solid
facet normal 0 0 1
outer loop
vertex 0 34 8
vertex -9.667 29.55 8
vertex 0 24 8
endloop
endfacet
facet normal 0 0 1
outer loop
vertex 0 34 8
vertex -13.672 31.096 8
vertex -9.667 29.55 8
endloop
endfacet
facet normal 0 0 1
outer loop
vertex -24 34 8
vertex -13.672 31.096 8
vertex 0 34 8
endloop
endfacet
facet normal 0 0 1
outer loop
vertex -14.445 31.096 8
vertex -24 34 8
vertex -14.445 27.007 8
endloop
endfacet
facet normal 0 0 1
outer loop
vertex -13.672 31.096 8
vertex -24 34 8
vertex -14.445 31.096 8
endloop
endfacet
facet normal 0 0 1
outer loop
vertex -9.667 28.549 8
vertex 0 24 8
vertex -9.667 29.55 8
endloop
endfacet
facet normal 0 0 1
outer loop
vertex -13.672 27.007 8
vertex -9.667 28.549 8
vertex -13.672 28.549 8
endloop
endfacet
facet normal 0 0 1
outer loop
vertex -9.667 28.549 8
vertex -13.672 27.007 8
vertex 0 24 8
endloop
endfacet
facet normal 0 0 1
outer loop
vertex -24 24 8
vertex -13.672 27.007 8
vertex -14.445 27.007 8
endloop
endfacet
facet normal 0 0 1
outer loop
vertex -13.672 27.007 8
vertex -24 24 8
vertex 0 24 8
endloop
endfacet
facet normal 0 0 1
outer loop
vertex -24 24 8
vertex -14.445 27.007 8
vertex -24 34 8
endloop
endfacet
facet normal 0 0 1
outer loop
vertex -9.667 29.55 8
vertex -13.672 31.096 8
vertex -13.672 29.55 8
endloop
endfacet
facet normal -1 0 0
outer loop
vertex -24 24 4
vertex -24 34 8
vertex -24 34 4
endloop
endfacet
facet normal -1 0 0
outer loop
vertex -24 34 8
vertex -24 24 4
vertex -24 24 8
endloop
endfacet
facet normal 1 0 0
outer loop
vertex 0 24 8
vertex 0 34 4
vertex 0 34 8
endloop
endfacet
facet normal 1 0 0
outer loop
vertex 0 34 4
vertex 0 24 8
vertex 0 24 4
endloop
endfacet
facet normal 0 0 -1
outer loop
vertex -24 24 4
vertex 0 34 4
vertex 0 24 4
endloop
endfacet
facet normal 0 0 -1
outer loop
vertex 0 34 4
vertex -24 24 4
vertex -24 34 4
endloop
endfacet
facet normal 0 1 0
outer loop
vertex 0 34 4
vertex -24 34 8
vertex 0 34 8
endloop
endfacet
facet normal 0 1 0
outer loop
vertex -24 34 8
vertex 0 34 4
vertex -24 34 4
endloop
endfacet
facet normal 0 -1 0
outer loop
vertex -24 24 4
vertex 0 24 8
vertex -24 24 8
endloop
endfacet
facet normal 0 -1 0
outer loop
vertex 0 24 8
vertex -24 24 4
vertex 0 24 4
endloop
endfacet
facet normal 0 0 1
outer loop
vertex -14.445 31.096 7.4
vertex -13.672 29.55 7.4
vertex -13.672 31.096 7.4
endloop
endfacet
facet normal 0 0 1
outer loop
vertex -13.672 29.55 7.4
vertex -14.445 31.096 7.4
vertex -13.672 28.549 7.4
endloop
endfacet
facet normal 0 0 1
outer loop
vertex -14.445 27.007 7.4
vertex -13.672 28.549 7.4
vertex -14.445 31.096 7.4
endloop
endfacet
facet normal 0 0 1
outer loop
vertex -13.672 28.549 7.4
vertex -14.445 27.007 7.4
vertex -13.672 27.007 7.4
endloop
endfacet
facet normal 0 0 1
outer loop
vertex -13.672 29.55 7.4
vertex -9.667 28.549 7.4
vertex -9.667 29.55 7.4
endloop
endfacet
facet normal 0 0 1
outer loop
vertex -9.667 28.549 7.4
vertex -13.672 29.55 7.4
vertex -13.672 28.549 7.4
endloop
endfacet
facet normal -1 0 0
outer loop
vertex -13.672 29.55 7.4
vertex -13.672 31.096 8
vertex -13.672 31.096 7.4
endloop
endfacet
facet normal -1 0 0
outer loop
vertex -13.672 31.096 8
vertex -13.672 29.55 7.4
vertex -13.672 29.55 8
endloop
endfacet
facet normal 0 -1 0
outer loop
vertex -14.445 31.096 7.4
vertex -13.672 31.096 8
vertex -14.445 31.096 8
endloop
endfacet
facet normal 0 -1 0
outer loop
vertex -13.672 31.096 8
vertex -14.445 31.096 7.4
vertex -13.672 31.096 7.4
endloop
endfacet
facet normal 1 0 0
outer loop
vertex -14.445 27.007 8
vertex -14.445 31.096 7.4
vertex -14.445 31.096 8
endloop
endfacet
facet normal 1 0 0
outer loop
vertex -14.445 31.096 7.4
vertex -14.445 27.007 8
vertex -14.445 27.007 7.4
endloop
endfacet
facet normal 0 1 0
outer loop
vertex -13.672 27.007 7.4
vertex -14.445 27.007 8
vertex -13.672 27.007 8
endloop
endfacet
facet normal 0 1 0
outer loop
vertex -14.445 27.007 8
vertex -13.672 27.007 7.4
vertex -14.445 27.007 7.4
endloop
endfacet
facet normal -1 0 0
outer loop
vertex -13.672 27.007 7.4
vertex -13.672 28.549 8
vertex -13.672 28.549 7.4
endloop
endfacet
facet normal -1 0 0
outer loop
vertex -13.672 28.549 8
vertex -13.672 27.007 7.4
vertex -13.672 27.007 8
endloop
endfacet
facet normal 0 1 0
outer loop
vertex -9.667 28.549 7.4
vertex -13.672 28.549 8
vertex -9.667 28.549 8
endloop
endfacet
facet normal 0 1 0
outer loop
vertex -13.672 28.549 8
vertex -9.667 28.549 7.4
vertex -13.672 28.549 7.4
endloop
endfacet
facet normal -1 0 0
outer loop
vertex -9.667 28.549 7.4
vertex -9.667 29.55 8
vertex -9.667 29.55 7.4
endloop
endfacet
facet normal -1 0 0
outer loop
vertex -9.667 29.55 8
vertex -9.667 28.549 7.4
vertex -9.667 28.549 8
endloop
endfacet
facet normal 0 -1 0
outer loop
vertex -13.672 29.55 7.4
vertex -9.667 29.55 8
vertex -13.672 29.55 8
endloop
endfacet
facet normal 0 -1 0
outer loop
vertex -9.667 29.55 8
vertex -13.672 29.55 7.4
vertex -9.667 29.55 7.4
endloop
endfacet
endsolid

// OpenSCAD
use <../../../tec_cold_block_mockup.scad>

support_hose_tab_export();
